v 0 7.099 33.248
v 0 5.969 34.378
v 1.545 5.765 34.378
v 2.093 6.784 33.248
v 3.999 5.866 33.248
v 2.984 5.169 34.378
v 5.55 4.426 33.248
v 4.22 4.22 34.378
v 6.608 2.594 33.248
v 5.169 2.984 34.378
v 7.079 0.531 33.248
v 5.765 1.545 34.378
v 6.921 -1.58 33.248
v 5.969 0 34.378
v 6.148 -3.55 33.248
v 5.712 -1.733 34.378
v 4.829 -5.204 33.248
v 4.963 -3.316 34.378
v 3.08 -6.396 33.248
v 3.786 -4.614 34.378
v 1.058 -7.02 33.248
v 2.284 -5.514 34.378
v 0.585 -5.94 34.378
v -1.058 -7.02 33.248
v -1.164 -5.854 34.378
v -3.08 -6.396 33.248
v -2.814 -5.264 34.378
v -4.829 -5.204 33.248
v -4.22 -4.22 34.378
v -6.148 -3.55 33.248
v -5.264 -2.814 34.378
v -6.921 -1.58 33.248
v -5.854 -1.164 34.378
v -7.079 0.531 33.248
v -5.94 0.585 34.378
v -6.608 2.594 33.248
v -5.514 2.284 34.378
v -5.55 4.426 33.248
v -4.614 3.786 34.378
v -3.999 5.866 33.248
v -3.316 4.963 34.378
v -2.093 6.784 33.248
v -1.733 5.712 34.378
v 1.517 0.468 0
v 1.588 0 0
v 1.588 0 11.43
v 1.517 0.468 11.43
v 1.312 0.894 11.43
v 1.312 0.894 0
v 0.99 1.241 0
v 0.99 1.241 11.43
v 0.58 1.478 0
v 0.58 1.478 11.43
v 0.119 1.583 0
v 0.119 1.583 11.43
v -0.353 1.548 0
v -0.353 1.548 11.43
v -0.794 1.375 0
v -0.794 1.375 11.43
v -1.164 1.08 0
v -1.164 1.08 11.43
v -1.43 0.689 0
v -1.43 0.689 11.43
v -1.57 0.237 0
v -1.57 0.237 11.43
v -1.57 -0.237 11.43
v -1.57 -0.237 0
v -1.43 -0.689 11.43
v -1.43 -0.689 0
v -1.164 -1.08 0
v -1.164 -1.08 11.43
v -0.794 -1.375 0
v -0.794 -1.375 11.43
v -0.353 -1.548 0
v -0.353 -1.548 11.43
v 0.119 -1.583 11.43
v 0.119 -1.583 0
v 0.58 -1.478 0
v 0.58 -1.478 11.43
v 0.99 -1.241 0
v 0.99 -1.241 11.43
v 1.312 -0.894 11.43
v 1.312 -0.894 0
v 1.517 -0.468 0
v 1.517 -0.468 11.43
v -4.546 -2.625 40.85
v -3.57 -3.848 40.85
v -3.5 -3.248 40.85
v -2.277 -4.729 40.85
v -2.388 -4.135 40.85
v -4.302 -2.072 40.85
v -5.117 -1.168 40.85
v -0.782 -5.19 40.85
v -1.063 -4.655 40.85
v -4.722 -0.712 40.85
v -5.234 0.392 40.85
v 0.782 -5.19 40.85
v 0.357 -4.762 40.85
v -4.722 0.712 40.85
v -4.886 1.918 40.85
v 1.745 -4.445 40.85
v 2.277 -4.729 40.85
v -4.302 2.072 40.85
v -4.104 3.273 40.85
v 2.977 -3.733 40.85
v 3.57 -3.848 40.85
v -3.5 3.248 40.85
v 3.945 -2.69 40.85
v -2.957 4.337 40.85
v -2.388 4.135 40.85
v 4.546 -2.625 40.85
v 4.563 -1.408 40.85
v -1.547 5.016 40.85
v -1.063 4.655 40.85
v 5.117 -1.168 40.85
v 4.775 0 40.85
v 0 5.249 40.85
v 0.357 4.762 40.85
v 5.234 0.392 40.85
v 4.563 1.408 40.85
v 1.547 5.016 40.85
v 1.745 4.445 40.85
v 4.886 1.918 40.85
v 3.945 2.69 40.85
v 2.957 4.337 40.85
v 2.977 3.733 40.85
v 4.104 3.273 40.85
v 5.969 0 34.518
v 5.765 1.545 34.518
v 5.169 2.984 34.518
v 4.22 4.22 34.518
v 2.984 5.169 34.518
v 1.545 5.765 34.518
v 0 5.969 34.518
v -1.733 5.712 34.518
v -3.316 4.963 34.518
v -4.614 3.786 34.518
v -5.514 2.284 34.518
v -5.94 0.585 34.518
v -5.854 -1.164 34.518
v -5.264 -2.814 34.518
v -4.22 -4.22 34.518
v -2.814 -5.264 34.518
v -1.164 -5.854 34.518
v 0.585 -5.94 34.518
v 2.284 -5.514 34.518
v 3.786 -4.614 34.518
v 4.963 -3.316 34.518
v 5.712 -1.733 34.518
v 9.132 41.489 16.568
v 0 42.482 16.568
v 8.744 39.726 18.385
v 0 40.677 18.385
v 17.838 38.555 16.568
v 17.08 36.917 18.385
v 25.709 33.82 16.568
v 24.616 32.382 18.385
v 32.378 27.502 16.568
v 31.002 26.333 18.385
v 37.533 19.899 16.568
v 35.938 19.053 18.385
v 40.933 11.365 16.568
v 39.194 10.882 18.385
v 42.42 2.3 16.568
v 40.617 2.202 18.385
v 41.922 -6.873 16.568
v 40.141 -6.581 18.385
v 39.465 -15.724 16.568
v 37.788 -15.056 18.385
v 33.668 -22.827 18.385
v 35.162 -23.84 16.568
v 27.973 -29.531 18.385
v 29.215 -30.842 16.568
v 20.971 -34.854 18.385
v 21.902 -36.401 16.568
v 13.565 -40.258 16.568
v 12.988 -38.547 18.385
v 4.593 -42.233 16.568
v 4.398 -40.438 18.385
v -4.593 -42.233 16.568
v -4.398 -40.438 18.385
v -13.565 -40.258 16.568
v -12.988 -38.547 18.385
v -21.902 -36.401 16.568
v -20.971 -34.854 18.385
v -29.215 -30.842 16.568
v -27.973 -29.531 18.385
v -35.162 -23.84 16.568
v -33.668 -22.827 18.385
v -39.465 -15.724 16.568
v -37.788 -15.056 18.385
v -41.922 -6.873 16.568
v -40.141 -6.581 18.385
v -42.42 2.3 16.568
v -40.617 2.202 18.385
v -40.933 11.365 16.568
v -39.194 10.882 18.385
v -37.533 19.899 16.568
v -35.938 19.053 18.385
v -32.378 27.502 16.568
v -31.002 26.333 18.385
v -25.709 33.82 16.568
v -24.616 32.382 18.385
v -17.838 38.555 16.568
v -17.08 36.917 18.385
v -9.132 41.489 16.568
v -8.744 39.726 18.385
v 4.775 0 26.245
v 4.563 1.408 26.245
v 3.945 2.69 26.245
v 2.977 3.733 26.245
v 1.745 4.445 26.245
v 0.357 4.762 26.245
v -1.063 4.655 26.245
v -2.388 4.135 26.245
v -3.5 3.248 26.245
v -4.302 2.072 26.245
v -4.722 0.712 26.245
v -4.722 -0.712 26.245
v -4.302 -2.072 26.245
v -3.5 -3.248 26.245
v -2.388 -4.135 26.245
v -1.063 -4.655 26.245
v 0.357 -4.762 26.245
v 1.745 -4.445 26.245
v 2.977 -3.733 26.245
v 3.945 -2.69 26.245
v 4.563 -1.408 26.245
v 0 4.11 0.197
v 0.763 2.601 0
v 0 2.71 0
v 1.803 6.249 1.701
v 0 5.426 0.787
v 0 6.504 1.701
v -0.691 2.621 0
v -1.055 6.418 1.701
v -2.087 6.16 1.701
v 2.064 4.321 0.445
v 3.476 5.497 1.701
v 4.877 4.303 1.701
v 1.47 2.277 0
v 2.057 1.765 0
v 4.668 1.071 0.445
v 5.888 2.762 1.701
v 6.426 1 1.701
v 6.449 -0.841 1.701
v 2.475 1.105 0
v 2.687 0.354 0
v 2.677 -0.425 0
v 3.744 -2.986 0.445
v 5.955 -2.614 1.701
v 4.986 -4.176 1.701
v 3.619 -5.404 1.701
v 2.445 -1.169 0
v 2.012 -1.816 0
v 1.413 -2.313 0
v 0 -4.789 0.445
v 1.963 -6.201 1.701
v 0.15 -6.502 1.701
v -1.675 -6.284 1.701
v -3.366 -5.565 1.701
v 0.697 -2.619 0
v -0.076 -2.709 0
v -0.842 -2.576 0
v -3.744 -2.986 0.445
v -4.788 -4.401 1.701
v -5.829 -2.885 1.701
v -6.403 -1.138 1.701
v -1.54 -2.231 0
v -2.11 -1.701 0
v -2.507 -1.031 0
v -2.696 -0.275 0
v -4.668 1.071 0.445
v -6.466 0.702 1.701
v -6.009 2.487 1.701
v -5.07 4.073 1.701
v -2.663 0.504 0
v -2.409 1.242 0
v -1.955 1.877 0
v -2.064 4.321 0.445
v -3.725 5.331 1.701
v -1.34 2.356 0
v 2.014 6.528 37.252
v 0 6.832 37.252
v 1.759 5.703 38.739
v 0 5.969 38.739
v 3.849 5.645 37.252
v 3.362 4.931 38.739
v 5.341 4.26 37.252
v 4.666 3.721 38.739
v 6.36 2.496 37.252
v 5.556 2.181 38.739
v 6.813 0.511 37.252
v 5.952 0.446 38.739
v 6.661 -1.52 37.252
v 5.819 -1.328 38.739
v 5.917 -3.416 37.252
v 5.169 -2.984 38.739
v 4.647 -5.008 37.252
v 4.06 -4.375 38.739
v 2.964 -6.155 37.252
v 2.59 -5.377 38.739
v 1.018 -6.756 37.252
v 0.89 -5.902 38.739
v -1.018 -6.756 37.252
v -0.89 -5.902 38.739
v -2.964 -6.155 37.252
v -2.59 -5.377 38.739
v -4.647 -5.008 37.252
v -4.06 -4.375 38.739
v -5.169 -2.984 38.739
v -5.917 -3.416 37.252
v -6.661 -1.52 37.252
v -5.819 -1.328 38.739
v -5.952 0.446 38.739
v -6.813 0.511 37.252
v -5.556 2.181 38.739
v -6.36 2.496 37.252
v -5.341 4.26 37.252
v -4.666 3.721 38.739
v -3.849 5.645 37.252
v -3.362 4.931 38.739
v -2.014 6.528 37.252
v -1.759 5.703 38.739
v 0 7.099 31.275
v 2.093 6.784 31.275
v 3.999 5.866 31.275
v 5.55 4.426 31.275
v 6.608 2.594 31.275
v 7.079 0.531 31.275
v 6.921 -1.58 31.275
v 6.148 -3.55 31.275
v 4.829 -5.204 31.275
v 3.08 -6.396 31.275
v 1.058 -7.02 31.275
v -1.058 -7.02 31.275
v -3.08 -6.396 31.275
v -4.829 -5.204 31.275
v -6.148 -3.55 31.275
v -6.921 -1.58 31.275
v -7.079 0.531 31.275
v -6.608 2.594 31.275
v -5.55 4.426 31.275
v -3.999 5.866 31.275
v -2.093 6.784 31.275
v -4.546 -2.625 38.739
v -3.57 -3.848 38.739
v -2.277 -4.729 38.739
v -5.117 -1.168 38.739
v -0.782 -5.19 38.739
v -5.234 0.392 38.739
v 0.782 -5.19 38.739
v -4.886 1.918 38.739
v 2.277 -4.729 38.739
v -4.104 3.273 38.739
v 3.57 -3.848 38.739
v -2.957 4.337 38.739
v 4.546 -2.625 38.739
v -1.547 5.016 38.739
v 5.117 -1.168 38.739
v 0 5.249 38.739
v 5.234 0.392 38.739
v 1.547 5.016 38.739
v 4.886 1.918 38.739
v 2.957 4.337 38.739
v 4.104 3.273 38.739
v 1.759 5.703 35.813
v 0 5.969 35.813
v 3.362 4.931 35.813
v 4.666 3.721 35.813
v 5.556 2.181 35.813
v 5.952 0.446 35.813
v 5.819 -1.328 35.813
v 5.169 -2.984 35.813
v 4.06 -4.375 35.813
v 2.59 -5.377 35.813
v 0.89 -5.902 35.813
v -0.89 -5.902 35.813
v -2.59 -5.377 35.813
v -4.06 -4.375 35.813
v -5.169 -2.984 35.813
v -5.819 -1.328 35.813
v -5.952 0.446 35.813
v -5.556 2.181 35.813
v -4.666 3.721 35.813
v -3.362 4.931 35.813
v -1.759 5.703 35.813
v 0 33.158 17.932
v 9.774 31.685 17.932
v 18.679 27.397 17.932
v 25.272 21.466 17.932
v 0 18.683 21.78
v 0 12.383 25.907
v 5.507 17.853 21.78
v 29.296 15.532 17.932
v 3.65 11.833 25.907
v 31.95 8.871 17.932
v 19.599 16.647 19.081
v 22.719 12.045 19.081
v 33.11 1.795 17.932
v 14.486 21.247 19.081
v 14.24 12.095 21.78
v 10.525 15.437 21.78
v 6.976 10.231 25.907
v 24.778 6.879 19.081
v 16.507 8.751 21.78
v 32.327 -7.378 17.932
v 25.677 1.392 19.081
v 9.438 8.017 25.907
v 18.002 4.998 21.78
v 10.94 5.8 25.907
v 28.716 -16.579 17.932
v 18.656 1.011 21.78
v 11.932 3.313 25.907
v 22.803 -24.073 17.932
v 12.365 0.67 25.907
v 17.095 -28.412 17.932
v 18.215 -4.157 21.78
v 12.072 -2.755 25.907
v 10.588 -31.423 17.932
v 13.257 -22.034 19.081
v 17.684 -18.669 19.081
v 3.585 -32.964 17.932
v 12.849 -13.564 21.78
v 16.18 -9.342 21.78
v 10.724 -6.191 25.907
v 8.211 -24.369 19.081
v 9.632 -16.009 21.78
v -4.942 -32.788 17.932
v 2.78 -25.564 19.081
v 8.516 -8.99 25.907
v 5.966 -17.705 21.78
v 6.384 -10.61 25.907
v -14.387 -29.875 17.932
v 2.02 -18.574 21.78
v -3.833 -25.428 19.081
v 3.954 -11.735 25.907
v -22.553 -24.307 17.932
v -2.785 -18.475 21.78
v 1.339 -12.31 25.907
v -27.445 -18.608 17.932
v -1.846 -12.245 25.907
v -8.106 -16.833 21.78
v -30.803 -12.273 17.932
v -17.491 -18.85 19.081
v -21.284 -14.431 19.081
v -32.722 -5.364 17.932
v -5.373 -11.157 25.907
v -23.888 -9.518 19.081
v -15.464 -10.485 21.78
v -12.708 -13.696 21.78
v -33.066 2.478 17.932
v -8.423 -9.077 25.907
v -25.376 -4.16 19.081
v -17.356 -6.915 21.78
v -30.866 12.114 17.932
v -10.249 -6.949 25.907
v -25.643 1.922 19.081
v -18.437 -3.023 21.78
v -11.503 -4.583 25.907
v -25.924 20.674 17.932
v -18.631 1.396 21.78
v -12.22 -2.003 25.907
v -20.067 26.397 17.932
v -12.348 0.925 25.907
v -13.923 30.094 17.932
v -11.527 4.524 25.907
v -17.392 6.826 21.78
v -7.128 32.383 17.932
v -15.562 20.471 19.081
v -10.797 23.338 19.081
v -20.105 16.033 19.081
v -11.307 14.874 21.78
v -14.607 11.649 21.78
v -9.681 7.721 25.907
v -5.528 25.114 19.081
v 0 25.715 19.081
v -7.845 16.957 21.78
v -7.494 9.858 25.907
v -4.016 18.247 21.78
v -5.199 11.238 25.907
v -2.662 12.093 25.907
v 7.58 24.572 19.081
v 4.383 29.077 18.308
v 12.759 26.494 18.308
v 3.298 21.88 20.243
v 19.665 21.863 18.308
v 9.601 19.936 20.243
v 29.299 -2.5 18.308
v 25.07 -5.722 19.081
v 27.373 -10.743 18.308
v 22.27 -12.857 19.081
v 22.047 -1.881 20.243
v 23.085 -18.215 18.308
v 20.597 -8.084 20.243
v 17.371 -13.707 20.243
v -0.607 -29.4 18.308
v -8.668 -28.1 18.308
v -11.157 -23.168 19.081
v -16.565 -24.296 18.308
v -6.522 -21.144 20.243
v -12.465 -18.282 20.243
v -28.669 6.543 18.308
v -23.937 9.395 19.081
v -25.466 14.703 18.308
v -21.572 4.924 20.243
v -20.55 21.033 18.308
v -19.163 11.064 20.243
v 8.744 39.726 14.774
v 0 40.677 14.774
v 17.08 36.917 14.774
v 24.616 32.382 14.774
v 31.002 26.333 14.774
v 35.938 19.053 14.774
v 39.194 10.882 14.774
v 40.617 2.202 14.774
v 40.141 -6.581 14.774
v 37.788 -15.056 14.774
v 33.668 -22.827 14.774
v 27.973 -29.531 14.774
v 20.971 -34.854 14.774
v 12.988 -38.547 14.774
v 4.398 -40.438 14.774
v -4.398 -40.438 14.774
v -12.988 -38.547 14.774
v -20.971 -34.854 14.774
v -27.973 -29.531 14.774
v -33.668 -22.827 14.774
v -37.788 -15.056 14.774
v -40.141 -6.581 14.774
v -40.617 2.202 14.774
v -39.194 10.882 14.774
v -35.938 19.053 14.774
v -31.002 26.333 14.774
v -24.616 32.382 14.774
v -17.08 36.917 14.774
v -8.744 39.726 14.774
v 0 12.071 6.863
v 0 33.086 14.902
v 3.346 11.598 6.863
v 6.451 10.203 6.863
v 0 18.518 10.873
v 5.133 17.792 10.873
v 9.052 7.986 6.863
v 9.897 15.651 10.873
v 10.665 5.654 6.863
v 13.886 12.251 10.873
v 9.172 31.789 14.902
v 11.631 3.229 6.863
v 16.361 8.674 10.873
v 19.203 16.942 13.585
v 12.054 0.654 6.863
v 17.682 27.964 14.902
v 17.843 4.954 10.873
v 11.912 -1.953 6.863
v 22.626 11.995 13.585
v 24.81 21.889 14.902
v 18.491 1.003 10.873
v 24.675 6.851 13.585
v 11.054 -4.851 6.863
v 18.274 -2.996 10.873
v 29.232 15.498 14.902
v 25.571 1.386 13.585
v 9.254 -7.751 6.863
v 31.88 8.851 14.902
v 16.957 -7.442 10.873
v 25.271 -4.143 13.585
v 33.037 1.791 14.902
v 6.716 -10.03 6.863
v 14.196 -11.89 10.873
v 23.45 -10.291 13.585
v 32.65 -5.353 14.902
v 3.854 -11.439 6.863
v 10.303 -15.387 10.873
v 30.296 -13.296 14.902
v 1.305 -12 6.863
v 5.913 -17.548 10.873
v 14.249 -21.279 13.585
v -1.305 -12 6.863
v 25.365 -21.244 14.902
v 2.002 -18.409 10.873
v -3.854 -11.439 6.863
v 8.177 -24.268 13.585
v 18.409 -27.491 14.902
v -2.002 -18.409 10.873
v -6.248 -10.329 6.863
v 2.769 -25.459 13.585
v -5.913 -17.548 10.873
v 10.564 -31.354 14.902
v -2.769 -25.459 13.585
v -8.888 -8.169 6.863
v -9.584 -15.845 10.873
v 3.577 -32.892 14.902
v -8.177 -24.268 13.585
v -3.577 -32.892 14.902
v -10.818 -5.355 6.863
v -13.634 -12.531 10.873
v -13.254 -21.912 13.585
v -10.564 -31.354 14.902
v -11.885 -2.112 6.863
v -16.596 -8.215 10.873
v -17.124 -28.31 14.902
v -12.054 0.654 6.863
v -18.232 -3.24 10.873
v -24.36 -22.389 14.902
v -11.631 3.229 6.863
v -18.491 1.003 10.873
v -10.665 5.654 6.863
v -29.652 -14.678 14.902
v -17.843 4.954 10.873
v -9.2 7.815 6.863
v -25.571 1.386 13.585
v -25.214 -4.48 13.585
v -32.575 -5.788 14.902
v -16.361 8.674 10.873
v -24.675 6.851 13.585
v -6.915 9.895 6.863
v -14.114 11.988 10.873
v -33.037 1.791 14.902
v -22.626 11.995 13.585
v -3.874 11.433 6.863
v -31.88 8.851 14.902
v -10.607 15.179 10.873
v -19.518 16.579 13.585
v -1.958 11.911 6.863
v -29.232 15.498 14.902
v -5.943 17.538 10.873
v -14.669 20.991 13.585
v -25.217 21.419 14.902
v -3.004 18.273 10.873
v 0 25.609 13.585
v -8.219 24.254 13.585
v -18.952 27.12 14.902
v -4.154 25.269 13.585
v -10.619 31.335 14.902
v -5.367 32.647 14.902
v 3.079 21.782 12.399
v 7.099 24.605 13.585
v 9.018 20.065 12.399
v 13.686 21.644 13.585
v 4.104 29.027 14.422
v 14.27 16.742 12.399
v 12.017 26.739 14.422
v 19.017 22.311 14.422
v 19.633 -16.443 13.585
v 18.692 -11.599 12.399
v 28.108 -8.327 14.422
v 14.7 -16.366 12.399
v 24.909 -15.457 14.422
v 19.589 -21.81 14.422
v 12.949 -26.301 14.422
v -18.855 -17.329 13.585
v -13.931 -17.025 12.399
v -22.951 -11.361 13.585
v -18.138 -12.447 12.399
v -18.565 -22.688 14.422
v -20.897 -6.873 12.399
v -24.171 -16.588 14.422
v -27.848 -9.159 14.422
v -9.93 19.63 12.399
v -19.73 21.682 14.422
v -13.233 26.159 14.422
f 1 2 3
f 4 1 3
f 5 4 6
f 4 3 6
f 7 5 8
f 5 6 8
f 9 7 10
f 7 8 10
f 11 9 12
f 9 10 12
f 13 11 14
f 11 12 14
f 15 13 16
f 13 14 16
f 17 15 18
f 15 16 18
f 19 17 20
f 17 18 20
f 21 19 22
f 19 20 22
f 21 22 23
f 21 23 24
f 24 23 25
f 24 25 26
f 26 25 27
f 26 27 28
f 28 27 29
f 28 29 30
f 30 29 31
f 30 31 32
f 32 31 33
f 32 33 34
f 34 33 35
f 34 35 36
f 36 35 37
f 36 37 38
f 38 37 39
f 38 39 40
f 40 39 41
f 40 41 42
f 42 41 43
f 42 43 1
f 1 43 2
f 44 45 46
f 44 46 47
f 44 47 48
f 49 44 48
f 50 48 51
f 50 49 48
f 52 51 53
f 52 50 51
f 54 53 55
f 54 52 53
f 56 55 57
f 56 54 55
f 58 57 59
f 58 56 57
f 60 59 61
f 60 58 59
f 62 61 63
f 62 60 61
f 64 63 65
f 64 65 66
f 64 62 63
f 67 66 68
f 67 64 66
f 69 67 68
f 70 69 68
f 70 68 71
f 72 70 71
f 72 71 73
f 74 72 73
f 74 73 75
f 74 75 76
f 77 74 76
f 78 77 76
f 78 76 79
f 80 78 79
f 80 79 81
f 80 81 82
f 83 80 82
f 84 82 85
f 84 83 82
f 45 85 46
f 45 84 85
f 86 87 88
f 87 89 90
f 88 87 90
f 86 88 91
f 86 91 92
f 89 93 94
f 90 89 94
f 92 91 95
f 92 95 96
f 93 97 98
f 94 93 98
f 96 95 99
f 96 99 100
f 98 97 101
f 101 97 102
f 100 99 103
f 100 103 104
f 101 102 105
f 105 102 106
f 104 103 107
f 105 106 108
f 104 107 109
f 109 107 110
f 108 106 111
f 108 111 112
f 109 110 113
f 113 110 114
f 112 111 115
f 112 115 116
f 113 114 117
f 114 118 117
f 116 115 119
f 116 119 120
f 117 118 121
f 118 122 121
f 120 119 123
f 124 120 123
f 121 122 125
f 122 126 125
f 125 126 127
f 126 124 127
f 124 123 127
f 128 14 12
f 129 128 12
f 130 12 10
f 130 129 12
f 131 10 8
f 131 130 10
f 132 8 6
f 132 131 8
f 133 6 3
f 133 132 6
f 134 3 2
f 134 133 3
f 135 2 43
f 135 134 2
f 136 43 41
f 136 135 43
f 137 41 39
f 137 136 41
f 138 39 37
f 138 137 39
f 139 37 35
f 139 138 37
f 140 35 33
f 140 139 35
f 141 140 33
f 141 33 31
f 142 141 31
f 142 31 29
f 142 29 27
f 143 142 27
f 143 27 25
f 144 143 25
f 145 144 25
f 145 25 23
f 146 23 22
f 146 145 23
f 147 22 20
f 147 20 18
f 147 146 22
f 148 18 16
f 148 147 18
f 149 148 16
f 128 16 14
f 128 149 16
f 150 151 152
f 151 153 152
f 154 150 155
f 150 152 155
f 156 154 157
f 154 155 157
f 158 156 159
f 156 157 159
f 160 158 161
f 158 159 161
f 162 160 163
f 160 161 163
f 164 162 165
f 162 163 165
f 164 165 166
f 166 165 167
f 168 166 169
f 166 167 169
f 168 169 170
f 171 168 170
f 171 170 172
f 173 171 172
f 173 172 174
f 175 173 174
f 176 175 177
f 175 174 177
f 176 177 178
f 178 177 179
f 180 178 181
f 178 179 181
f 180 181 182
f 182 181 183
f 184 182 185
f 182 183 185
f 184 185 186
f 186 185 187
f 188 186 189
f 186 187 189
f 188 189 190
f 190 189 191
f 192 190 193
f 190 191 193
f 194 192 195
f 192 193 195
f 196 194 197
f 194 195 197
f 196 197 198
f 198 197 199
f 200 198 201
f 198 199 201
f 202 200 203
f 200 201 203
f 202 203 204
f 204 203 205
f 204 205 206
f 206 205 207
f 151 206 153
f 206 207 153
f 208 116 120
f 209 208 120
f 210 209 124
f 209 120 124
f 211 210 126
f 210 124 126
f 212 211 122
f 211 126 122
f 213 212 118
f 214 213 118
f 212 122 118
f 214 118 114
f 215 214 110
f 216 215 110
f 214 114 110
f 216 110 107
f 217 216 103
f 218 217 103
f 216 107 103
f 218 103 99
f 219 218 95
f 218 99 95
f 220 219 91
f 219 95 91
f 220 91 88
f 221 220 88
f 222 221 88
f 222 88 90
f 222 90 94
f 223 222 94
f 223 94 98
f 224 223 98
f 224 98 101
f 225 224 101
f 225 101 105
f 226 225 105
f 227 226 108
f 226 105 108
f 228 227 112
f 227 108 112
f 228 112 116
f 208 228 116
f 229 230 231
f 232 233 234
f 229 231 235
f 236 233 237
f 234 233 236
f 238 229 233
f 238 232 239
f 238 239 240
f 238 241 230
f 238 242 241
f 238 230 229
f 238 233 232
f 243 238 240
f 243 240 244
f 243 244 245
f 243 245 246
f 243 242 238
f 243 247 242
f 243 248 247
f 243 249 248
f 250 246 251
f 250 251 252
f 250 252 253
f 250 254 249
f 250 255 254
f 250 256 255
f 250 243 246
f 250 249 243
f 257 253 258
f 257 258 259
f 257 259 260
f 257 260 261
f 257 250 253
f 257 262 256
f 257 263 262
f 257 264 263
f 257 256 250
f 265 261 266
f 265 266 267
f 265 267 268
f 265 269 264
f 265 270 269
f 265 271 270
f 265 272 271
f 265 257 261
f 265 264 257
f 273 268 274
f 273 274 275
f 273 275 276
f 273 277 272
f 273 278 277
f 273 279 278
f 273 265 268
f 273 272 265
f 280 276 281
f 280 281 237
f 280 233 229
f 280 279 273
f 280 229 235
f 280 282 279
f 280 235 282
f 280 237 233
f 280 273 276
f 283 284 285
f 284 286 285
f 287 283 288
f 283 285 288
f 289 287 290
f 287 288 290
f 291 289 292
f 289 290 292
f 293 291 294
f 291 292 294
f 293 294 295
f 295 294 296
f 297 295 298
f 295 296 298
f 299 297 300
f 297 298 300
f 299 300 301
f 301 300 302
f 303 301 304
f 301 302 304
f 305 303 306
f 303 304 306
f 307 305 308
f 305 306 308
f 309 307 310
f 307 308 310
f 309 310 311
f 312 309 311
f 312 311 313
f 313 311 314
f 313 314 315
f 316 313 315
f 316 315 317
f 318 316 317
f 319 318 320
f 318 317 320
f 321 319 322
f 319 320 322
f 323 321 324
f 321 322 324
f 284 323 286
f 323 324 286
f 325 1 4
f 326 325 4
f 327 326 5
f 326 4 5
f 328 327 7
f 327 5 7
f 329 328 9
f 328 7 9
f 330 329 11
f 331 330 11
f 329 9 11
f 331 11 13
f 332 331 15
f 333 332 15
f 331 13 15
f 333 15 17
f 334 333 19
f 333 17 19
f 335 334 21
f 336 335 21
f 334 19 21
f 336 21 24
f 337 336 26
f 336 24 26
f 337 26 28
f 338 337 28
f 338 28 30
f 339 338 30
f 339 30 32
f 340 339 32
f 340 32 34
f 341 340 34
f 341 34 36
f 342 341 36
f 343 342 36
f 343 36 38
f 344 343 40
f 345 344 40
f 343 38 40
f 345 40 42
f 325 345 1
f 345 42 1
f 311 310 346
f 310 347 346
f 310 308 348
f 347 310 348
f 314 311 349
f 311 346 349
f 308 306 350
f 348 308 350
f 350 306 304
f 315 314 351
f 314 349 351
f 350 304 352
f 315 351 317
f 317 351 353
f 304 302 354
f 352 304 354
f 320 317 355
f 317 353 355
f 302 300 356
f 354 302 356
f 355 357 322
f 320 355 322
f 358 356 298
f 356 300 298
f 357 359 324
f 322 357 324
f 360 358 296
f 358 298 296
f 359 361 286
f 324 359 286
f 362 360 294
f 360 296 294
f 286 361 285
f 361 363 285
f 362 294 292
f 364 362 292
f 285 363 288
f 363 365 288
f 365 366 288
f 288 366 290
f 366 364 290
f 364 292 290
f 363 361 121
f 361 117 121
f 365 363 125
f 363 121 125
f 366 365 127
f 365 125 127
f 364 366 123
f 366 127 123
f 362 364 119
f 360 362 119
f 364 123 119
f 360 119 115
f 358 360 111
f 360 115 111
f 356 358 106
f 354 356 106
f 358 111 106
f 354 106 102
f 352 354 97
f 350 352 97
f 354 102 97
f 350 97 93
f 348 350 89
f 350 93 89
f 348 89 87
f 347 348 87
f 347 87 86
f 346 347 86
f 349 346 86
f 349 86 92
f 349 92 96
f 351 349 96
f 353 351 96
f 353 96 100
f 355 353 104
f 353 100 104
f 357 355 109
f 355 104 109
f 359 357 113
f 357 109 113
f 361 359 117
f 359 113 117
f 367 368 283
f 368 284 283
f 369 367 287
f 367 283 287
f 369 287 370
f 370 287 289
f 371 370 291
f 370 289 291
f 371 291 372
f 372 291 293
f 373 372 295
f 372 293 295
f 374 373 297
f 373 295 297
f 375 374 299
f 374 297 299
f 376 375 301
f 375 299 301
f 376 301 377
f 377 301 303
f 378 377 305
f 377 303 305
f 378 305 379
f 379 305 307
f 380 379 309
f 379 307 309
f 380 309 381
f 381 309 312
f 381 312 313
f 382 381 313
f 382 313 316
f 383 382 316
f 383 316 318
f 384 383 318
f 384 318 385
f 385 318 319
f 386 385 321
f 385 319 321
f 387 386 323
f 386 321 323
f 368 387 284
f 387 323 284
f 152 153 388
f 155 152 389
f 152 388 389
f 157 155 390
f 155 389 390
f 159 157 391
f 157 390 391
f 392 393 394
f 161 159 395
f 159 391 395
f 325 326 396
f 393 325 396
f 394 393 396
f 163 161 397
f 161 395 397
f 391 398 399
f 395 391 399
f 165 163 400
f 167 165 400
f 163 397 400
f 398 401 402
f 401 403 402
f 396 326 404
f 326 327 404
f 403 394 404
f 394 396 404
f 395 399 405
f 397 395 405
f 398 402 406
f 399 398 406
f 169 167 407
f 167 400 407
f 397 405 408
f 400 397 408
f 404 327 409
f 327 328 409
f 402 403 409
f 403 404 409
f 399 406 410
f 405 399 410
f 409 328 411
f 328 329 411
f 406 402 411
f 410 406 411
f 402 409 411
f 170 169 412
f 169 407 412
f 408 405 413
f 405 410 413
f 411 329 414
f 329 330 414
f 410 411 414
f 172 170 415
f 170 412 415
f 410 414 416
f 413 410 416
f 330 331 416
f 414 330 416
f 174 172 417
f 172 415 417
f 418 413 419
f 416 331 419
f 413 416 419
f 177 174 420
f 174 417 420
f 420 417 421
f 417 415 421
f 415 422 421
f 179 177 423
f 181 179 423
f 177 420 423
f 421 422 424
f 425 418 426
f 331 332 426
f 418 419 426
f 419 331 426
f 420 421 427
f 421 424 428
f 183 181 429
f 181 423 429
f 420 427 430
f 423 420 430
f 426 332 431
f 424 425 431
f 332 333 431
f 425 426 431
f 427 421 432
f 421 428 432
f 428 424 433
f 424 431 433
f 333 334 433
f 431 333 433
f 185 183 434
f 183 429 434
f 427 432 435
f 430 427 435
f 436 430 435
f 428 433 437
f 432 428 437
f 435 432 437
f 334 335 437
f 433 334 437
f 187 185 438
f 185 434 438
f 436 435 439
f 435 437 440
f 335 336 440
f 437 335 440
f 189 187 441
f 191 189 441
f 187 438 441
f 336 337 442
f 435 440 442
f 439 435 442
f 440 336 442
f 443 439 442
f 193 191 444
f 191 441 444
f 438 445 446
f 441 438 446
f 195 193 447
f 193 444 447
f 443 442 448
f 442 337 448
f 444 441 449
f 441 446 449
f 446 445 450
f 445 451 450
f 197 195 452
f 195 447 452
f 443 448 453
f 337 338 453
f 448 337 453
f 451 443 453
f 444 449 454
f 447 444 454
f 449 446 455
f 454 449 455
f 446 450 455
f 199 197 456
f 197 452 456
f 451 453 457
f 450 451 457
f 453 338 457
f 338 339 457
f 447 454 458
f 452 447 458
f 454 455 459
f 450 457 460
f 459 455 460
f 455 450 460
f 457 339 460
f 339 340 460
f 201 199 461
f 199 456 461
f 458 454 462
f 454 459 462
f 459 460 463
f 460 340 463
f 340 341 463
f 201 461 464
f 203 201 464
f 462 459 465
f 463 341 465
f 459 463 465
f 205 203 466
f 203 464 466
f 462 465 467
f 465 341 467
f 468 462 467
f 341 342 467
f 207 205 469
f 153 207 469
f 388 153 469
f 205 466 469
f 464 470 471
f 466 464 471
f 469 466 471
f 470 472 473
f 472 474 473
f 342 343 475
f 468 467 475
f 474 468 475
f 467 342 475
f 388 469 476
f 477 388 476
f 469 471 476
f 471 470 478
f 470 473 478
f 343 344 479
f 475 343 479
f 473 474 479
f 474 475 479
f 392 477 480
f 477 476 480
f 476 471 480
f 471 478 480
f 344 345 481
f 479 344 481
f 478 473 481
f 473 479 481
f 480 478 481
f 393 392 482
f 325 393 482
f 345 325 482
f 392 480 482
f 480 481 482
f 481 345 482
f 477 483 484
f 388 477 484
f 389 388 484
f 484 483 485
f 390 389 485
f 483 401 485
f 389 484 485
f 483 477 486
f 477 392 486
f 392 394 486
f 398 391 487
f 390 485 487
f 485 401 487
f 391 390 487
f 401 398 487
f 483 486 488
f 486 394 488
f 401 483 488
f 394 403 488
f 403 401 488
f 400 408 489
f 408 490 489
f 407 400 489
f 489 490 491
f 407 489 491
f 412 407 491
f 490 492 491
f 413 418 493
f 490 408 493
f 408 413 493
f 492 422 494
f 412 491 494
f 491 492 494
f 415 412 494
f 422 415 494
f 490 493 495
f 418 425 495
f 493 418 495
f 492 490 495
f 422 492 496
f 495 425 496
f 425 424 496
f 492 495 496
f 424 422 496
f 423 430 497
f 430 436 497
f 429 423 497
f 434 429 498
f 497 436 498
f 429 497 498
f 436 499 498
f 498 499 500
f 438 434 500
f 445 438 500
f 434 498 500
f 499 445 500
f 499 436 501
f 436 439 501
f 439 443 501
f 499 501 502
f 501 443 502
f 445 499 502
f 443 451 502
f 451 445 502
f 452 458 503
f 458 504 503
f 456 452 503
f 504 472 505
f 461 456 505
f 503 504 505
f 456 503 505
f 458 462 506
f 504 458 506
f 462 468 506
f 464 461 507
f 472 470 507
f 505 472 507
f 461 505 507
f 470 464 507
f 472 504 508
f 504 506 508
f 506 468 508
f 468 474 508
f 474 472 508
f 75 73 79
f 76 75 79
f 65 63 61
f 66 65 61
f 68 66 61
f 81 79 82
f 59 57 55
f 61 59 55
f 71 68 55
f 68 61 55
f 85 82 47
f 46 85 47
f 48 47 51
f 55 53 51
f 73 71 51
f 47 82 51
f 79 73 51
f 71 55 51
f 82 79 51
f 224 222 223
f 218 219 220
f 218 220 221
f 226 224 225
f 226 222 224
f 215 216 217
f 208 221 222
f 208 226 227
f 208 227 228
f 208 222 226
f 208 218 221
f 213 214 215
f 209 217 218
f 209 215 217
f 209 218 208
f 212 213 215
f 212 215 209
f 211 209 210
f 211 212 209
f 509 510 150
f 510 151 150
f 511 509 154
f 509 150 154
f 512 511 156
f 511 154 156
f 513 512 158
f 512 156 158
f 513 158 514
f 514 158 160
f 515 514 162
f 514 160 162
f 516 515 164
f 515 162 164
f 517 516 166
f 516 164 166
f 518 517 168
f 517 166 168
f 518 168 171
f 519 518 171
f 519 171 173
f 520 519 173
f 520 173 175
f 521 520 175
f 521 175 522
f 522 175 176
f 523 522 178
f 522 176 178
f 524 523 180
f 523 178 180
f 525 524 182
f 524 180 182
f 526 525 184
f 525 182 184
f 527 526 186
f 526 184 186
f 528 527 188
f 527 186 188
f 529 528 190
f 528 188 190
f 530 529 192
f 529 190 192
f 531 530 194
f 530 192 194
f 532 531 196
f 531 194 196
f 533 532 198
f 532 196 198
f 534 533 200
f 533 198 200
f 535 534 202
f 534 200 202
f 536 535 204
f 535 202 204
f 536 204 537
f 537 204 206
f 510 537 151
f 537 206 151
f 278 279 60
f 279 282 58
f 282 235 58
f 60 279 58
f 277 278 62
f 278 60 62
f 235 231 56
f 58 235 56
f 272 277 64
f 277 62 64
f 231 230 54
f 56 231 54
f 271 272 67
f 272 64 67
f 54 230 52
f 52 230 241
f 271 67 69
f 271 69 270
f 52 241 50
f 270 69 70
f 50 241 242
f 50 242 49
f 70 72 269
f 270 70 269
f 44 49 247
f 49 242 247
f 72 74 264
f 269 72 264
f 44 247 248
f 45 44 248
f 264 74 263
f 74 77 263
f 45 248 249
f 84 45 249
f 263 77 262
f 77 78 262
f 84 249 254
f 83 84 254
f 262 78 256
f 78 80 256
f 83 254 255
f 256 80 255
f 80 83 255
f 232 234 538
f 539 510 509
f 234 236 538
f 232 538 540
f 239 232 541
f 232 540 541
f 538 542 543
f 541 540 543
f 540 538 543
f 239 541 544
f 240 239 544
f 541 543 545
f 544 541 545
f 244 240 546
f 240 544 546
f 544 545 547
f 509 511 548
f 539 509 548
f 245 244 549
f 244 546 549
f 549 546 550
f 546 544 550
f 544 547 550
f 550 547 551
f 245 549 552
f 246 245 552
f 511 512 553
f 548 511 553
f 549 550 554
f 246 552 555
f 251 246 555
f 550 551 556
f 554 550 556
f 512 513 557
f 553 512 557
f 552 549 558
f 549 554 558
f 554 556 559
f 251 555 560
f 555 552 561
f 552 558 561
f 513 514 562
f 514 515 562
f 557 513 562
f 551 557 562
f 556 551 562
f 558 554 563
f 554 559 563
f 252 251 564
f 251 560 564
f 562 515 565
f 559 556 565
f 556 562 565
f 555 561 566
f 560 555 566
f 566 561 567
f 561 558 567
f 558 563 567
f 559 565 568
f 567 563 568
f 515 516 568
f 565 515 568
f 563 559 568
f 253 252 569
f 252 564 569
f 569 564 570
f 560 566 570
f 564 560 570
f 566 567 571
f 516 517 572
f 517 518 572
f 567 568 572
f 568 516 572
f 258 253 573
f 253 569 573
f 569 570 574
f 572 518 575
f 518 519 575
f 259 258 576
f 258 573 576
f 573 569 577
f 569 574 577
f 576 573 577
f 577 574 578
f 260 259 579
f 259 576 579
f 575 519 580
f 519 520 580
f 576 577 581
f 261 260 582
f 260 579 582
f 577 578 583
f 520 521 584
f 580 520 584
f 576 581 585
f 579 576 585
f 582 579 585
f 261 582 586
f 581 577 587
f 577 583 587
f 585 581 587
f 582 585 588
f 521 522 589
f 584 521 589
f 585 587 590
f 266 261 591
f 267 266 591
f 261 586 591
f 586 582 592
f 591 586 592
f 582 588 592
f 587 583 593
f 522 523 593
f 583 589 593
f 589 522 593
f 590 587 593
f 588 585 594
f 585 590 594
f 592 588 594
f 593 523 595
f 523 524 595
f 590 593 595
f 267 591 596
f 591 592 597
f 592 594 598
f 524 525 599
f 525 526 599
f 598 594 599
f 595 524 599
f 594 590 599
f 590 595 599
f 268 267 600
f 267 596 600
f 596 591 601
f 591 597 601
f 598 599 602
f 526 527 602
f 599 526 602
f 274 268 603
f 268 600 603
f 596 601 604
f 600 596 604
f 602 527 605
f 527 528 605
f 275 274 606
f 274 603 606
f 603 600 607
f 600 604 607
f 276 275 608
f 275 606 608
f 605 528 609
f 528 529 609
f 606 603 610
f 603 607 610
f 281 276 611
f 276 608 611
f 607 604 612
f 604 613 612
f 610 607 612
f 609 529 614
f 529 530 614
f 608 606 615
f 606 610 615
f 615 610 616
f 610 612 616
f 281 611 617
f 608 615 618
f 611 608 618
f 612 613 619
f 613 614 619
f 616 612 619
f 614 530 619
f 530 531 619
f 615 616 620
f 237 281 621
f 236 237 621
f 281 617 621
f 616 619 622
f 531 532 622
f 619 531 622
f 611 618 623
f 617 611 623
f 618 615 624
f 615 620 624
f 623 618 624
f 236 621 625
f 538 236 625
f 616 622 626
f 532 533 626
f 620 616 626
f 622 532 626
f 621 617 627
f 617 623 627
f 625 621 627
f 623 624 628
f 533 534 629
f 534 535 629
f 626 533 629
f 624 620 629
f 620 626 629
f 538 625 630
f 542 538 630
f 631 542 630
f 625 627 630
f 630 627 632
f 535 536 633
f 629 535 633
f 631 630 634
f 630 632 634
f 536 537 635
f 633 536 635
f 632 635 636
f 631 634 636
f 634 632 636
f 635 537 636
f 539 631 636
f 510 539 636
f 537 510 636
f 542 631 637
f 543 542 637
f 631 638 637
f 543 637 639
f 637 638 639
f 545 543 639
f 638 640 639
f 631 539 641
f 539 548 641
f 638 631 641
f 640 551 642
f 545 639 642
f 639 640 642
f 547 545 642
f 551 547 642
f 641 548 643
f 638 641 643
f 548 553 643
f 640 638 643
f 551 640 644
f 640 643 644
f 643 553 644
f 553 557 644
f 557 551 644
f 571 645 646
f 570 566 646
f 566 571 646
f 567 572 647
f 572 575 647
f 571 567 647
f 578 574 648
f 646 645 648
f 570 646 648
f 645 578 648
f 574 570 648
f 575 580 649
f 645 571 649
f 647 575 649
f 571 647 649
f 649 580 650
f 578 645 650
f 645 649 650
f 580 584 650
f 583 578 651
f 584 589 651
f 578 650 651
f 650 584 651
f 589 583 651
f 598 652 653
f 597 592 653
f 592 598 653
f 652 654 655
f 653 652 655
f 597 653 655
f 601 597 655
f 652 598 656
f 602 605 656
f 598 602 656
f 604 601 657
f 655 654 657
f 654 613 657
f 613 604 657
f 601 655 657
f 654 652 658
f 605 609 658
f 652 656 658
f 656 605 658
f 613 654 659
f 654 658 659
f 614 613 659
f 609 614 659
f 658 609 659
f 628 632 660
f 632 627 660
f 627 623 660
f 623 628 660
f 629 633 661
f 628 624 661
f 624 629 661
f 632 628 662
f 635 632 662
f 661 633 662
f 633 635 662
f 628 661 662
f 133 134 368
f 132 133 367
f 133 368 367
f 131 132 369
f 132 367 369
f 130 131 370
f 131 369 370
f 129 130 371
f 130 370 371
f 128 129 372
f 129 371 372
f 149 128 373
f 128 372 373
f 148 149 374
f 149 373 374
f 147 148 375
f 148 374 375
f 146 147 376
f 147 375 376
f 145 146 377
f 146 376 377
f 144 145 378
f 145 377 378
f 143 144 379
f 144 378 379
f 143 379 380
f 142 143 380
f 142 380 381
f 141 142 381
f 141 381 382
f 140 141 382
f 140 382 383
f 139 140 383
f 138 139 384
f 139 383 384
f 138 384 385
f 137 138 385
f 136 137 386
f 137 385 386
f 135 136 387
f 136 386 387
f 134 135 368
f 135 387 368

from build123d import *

# Parameters (mm, degrees)
F2_R        = 5.08
F3_S5_R     = 5.9685739689
F3_T6_DEPTH = 12
F4_R        = 4.7752
F5_DEPTH    = 14.605
F6_R        = 1.6002
F7_DEPTH    = 11.43
F8_R        = 1.5875
F9_DEPTH    = 11.43


# Not quite as in the source:
# - a fillet or chamfer that OpenCascade refuses, or shapes differently, is made with other operations: its cross-section is extruded or revolved along the edge and cut away or added


with BuildPart() as f1:
    # F0 (on Right) → F1 (revolve)
    with BuildSketch(Plane.YZ):
        with BuildLine():
            Line((0, 40.8495813608), (0, 0))
            Line((0, 0), (5.0717149861, 0))
            ThreePointArc((5.0717149861, 0), (20.9654737991, 11.9868064796), (40.676549077, 14.7740291432))
            Line((40.676549077, 14.7740291432), (42.4818582833, 16.5677014738))
            Line((42.4818582833, 16.5677014738), (40.676549077, 18.3847230526))
            ThreePointArc((40.676549077, 18.3847230526), (22.1270293001, 20.2430061627), (7.0992088877, 31.2748923898))
            Line((7.0992088877, 31.2748923898), (7.0992088877, 34.5178544521))
            Line((7.0992088877, 34.5178544521), (5.9685739689, 34.5178544521))
            Line((5.9685739689, 34.5178544521), (5.9685739689, 35.8129814267))
            Line((5.9685739689, 35.8129814267), (6.8319910206, 37.2520089149))
            Line((6.8319910206, 37.2520089149), (5.9685739689, 38.7390069664))
            Line((5.9685739689, 38.7390069664), (5.2490597591, 38.7390069664))
            Line((5.2490597591, 38.7390069664), (5.2490597591, 40.8495813608))
            Line((5.2490597591, 40.8495813608), (0, 40.8495813608))
        make_face()
    revolve(axis=Axis((0, 0, 20.4247906804), (0, 0, -1)))

    # F2
    f2_edges = [f1.edges().sort_by_distance(p)[0] for p in [
        (0, -5.071715, 0),
    ]]
    fillet(f2_edges, radius=F2_R)

    # F3: chamfer of 1.27 on 1 edges, made by hand


with BuildPart() as f3_tool2:
    # F3_s3 → F3_t4 (revolve)
    with BuildSketch(Plane.YZ):
        Polygon((7.0992088877, 33.2478544521), (5.8292088877, 34.5178544521), (7.0992088877, 34.5178544521), align=None)
    revolve(axis=Axis((0, 0, 34.5178544521), (0, 0, -1)))

    # F3_s5 → F3_t6 (cut, symmetric)
    with BuildSketch(Plane.XY.offset(33.9)):
        Circle(F3_S5_R)
    extrude(amount=F3_T6_DEPTH, both=True, mode=Mode.SUBTRACT)


with BuildPart() as f1_1:
    add(f1.part)

    # F3_t1: cut F3_tool2
    add(f3_tool2.part, mode=Mode.SUBTRACT)

    # F4 (on face) → F5 (cut)
    with BuildSketch(Plane.XY.offset(40.8495813608)):
        Circle(F4_R)
    extrude(amount=-F5_DEPTH, mode=Mode.SUBTRACT)

    # F6 (on face) → F7 (join)
    with BuildSketch(Plane(origin=(0, 0, 0), x_dir=(1, 0, 0), z_dir=(0, 0, -1))):
        Circle(F6_R)
    extrude(amount=-F7_DEPTH)

    # F8 (on Top) → F9 (cut)
    with BuildSketch(Plane.XY):
        Circle(F8_R)
    extrude(amount=F9_DEPTH, mode=Mode.SUBTRACT)


solid = f1_1.part
